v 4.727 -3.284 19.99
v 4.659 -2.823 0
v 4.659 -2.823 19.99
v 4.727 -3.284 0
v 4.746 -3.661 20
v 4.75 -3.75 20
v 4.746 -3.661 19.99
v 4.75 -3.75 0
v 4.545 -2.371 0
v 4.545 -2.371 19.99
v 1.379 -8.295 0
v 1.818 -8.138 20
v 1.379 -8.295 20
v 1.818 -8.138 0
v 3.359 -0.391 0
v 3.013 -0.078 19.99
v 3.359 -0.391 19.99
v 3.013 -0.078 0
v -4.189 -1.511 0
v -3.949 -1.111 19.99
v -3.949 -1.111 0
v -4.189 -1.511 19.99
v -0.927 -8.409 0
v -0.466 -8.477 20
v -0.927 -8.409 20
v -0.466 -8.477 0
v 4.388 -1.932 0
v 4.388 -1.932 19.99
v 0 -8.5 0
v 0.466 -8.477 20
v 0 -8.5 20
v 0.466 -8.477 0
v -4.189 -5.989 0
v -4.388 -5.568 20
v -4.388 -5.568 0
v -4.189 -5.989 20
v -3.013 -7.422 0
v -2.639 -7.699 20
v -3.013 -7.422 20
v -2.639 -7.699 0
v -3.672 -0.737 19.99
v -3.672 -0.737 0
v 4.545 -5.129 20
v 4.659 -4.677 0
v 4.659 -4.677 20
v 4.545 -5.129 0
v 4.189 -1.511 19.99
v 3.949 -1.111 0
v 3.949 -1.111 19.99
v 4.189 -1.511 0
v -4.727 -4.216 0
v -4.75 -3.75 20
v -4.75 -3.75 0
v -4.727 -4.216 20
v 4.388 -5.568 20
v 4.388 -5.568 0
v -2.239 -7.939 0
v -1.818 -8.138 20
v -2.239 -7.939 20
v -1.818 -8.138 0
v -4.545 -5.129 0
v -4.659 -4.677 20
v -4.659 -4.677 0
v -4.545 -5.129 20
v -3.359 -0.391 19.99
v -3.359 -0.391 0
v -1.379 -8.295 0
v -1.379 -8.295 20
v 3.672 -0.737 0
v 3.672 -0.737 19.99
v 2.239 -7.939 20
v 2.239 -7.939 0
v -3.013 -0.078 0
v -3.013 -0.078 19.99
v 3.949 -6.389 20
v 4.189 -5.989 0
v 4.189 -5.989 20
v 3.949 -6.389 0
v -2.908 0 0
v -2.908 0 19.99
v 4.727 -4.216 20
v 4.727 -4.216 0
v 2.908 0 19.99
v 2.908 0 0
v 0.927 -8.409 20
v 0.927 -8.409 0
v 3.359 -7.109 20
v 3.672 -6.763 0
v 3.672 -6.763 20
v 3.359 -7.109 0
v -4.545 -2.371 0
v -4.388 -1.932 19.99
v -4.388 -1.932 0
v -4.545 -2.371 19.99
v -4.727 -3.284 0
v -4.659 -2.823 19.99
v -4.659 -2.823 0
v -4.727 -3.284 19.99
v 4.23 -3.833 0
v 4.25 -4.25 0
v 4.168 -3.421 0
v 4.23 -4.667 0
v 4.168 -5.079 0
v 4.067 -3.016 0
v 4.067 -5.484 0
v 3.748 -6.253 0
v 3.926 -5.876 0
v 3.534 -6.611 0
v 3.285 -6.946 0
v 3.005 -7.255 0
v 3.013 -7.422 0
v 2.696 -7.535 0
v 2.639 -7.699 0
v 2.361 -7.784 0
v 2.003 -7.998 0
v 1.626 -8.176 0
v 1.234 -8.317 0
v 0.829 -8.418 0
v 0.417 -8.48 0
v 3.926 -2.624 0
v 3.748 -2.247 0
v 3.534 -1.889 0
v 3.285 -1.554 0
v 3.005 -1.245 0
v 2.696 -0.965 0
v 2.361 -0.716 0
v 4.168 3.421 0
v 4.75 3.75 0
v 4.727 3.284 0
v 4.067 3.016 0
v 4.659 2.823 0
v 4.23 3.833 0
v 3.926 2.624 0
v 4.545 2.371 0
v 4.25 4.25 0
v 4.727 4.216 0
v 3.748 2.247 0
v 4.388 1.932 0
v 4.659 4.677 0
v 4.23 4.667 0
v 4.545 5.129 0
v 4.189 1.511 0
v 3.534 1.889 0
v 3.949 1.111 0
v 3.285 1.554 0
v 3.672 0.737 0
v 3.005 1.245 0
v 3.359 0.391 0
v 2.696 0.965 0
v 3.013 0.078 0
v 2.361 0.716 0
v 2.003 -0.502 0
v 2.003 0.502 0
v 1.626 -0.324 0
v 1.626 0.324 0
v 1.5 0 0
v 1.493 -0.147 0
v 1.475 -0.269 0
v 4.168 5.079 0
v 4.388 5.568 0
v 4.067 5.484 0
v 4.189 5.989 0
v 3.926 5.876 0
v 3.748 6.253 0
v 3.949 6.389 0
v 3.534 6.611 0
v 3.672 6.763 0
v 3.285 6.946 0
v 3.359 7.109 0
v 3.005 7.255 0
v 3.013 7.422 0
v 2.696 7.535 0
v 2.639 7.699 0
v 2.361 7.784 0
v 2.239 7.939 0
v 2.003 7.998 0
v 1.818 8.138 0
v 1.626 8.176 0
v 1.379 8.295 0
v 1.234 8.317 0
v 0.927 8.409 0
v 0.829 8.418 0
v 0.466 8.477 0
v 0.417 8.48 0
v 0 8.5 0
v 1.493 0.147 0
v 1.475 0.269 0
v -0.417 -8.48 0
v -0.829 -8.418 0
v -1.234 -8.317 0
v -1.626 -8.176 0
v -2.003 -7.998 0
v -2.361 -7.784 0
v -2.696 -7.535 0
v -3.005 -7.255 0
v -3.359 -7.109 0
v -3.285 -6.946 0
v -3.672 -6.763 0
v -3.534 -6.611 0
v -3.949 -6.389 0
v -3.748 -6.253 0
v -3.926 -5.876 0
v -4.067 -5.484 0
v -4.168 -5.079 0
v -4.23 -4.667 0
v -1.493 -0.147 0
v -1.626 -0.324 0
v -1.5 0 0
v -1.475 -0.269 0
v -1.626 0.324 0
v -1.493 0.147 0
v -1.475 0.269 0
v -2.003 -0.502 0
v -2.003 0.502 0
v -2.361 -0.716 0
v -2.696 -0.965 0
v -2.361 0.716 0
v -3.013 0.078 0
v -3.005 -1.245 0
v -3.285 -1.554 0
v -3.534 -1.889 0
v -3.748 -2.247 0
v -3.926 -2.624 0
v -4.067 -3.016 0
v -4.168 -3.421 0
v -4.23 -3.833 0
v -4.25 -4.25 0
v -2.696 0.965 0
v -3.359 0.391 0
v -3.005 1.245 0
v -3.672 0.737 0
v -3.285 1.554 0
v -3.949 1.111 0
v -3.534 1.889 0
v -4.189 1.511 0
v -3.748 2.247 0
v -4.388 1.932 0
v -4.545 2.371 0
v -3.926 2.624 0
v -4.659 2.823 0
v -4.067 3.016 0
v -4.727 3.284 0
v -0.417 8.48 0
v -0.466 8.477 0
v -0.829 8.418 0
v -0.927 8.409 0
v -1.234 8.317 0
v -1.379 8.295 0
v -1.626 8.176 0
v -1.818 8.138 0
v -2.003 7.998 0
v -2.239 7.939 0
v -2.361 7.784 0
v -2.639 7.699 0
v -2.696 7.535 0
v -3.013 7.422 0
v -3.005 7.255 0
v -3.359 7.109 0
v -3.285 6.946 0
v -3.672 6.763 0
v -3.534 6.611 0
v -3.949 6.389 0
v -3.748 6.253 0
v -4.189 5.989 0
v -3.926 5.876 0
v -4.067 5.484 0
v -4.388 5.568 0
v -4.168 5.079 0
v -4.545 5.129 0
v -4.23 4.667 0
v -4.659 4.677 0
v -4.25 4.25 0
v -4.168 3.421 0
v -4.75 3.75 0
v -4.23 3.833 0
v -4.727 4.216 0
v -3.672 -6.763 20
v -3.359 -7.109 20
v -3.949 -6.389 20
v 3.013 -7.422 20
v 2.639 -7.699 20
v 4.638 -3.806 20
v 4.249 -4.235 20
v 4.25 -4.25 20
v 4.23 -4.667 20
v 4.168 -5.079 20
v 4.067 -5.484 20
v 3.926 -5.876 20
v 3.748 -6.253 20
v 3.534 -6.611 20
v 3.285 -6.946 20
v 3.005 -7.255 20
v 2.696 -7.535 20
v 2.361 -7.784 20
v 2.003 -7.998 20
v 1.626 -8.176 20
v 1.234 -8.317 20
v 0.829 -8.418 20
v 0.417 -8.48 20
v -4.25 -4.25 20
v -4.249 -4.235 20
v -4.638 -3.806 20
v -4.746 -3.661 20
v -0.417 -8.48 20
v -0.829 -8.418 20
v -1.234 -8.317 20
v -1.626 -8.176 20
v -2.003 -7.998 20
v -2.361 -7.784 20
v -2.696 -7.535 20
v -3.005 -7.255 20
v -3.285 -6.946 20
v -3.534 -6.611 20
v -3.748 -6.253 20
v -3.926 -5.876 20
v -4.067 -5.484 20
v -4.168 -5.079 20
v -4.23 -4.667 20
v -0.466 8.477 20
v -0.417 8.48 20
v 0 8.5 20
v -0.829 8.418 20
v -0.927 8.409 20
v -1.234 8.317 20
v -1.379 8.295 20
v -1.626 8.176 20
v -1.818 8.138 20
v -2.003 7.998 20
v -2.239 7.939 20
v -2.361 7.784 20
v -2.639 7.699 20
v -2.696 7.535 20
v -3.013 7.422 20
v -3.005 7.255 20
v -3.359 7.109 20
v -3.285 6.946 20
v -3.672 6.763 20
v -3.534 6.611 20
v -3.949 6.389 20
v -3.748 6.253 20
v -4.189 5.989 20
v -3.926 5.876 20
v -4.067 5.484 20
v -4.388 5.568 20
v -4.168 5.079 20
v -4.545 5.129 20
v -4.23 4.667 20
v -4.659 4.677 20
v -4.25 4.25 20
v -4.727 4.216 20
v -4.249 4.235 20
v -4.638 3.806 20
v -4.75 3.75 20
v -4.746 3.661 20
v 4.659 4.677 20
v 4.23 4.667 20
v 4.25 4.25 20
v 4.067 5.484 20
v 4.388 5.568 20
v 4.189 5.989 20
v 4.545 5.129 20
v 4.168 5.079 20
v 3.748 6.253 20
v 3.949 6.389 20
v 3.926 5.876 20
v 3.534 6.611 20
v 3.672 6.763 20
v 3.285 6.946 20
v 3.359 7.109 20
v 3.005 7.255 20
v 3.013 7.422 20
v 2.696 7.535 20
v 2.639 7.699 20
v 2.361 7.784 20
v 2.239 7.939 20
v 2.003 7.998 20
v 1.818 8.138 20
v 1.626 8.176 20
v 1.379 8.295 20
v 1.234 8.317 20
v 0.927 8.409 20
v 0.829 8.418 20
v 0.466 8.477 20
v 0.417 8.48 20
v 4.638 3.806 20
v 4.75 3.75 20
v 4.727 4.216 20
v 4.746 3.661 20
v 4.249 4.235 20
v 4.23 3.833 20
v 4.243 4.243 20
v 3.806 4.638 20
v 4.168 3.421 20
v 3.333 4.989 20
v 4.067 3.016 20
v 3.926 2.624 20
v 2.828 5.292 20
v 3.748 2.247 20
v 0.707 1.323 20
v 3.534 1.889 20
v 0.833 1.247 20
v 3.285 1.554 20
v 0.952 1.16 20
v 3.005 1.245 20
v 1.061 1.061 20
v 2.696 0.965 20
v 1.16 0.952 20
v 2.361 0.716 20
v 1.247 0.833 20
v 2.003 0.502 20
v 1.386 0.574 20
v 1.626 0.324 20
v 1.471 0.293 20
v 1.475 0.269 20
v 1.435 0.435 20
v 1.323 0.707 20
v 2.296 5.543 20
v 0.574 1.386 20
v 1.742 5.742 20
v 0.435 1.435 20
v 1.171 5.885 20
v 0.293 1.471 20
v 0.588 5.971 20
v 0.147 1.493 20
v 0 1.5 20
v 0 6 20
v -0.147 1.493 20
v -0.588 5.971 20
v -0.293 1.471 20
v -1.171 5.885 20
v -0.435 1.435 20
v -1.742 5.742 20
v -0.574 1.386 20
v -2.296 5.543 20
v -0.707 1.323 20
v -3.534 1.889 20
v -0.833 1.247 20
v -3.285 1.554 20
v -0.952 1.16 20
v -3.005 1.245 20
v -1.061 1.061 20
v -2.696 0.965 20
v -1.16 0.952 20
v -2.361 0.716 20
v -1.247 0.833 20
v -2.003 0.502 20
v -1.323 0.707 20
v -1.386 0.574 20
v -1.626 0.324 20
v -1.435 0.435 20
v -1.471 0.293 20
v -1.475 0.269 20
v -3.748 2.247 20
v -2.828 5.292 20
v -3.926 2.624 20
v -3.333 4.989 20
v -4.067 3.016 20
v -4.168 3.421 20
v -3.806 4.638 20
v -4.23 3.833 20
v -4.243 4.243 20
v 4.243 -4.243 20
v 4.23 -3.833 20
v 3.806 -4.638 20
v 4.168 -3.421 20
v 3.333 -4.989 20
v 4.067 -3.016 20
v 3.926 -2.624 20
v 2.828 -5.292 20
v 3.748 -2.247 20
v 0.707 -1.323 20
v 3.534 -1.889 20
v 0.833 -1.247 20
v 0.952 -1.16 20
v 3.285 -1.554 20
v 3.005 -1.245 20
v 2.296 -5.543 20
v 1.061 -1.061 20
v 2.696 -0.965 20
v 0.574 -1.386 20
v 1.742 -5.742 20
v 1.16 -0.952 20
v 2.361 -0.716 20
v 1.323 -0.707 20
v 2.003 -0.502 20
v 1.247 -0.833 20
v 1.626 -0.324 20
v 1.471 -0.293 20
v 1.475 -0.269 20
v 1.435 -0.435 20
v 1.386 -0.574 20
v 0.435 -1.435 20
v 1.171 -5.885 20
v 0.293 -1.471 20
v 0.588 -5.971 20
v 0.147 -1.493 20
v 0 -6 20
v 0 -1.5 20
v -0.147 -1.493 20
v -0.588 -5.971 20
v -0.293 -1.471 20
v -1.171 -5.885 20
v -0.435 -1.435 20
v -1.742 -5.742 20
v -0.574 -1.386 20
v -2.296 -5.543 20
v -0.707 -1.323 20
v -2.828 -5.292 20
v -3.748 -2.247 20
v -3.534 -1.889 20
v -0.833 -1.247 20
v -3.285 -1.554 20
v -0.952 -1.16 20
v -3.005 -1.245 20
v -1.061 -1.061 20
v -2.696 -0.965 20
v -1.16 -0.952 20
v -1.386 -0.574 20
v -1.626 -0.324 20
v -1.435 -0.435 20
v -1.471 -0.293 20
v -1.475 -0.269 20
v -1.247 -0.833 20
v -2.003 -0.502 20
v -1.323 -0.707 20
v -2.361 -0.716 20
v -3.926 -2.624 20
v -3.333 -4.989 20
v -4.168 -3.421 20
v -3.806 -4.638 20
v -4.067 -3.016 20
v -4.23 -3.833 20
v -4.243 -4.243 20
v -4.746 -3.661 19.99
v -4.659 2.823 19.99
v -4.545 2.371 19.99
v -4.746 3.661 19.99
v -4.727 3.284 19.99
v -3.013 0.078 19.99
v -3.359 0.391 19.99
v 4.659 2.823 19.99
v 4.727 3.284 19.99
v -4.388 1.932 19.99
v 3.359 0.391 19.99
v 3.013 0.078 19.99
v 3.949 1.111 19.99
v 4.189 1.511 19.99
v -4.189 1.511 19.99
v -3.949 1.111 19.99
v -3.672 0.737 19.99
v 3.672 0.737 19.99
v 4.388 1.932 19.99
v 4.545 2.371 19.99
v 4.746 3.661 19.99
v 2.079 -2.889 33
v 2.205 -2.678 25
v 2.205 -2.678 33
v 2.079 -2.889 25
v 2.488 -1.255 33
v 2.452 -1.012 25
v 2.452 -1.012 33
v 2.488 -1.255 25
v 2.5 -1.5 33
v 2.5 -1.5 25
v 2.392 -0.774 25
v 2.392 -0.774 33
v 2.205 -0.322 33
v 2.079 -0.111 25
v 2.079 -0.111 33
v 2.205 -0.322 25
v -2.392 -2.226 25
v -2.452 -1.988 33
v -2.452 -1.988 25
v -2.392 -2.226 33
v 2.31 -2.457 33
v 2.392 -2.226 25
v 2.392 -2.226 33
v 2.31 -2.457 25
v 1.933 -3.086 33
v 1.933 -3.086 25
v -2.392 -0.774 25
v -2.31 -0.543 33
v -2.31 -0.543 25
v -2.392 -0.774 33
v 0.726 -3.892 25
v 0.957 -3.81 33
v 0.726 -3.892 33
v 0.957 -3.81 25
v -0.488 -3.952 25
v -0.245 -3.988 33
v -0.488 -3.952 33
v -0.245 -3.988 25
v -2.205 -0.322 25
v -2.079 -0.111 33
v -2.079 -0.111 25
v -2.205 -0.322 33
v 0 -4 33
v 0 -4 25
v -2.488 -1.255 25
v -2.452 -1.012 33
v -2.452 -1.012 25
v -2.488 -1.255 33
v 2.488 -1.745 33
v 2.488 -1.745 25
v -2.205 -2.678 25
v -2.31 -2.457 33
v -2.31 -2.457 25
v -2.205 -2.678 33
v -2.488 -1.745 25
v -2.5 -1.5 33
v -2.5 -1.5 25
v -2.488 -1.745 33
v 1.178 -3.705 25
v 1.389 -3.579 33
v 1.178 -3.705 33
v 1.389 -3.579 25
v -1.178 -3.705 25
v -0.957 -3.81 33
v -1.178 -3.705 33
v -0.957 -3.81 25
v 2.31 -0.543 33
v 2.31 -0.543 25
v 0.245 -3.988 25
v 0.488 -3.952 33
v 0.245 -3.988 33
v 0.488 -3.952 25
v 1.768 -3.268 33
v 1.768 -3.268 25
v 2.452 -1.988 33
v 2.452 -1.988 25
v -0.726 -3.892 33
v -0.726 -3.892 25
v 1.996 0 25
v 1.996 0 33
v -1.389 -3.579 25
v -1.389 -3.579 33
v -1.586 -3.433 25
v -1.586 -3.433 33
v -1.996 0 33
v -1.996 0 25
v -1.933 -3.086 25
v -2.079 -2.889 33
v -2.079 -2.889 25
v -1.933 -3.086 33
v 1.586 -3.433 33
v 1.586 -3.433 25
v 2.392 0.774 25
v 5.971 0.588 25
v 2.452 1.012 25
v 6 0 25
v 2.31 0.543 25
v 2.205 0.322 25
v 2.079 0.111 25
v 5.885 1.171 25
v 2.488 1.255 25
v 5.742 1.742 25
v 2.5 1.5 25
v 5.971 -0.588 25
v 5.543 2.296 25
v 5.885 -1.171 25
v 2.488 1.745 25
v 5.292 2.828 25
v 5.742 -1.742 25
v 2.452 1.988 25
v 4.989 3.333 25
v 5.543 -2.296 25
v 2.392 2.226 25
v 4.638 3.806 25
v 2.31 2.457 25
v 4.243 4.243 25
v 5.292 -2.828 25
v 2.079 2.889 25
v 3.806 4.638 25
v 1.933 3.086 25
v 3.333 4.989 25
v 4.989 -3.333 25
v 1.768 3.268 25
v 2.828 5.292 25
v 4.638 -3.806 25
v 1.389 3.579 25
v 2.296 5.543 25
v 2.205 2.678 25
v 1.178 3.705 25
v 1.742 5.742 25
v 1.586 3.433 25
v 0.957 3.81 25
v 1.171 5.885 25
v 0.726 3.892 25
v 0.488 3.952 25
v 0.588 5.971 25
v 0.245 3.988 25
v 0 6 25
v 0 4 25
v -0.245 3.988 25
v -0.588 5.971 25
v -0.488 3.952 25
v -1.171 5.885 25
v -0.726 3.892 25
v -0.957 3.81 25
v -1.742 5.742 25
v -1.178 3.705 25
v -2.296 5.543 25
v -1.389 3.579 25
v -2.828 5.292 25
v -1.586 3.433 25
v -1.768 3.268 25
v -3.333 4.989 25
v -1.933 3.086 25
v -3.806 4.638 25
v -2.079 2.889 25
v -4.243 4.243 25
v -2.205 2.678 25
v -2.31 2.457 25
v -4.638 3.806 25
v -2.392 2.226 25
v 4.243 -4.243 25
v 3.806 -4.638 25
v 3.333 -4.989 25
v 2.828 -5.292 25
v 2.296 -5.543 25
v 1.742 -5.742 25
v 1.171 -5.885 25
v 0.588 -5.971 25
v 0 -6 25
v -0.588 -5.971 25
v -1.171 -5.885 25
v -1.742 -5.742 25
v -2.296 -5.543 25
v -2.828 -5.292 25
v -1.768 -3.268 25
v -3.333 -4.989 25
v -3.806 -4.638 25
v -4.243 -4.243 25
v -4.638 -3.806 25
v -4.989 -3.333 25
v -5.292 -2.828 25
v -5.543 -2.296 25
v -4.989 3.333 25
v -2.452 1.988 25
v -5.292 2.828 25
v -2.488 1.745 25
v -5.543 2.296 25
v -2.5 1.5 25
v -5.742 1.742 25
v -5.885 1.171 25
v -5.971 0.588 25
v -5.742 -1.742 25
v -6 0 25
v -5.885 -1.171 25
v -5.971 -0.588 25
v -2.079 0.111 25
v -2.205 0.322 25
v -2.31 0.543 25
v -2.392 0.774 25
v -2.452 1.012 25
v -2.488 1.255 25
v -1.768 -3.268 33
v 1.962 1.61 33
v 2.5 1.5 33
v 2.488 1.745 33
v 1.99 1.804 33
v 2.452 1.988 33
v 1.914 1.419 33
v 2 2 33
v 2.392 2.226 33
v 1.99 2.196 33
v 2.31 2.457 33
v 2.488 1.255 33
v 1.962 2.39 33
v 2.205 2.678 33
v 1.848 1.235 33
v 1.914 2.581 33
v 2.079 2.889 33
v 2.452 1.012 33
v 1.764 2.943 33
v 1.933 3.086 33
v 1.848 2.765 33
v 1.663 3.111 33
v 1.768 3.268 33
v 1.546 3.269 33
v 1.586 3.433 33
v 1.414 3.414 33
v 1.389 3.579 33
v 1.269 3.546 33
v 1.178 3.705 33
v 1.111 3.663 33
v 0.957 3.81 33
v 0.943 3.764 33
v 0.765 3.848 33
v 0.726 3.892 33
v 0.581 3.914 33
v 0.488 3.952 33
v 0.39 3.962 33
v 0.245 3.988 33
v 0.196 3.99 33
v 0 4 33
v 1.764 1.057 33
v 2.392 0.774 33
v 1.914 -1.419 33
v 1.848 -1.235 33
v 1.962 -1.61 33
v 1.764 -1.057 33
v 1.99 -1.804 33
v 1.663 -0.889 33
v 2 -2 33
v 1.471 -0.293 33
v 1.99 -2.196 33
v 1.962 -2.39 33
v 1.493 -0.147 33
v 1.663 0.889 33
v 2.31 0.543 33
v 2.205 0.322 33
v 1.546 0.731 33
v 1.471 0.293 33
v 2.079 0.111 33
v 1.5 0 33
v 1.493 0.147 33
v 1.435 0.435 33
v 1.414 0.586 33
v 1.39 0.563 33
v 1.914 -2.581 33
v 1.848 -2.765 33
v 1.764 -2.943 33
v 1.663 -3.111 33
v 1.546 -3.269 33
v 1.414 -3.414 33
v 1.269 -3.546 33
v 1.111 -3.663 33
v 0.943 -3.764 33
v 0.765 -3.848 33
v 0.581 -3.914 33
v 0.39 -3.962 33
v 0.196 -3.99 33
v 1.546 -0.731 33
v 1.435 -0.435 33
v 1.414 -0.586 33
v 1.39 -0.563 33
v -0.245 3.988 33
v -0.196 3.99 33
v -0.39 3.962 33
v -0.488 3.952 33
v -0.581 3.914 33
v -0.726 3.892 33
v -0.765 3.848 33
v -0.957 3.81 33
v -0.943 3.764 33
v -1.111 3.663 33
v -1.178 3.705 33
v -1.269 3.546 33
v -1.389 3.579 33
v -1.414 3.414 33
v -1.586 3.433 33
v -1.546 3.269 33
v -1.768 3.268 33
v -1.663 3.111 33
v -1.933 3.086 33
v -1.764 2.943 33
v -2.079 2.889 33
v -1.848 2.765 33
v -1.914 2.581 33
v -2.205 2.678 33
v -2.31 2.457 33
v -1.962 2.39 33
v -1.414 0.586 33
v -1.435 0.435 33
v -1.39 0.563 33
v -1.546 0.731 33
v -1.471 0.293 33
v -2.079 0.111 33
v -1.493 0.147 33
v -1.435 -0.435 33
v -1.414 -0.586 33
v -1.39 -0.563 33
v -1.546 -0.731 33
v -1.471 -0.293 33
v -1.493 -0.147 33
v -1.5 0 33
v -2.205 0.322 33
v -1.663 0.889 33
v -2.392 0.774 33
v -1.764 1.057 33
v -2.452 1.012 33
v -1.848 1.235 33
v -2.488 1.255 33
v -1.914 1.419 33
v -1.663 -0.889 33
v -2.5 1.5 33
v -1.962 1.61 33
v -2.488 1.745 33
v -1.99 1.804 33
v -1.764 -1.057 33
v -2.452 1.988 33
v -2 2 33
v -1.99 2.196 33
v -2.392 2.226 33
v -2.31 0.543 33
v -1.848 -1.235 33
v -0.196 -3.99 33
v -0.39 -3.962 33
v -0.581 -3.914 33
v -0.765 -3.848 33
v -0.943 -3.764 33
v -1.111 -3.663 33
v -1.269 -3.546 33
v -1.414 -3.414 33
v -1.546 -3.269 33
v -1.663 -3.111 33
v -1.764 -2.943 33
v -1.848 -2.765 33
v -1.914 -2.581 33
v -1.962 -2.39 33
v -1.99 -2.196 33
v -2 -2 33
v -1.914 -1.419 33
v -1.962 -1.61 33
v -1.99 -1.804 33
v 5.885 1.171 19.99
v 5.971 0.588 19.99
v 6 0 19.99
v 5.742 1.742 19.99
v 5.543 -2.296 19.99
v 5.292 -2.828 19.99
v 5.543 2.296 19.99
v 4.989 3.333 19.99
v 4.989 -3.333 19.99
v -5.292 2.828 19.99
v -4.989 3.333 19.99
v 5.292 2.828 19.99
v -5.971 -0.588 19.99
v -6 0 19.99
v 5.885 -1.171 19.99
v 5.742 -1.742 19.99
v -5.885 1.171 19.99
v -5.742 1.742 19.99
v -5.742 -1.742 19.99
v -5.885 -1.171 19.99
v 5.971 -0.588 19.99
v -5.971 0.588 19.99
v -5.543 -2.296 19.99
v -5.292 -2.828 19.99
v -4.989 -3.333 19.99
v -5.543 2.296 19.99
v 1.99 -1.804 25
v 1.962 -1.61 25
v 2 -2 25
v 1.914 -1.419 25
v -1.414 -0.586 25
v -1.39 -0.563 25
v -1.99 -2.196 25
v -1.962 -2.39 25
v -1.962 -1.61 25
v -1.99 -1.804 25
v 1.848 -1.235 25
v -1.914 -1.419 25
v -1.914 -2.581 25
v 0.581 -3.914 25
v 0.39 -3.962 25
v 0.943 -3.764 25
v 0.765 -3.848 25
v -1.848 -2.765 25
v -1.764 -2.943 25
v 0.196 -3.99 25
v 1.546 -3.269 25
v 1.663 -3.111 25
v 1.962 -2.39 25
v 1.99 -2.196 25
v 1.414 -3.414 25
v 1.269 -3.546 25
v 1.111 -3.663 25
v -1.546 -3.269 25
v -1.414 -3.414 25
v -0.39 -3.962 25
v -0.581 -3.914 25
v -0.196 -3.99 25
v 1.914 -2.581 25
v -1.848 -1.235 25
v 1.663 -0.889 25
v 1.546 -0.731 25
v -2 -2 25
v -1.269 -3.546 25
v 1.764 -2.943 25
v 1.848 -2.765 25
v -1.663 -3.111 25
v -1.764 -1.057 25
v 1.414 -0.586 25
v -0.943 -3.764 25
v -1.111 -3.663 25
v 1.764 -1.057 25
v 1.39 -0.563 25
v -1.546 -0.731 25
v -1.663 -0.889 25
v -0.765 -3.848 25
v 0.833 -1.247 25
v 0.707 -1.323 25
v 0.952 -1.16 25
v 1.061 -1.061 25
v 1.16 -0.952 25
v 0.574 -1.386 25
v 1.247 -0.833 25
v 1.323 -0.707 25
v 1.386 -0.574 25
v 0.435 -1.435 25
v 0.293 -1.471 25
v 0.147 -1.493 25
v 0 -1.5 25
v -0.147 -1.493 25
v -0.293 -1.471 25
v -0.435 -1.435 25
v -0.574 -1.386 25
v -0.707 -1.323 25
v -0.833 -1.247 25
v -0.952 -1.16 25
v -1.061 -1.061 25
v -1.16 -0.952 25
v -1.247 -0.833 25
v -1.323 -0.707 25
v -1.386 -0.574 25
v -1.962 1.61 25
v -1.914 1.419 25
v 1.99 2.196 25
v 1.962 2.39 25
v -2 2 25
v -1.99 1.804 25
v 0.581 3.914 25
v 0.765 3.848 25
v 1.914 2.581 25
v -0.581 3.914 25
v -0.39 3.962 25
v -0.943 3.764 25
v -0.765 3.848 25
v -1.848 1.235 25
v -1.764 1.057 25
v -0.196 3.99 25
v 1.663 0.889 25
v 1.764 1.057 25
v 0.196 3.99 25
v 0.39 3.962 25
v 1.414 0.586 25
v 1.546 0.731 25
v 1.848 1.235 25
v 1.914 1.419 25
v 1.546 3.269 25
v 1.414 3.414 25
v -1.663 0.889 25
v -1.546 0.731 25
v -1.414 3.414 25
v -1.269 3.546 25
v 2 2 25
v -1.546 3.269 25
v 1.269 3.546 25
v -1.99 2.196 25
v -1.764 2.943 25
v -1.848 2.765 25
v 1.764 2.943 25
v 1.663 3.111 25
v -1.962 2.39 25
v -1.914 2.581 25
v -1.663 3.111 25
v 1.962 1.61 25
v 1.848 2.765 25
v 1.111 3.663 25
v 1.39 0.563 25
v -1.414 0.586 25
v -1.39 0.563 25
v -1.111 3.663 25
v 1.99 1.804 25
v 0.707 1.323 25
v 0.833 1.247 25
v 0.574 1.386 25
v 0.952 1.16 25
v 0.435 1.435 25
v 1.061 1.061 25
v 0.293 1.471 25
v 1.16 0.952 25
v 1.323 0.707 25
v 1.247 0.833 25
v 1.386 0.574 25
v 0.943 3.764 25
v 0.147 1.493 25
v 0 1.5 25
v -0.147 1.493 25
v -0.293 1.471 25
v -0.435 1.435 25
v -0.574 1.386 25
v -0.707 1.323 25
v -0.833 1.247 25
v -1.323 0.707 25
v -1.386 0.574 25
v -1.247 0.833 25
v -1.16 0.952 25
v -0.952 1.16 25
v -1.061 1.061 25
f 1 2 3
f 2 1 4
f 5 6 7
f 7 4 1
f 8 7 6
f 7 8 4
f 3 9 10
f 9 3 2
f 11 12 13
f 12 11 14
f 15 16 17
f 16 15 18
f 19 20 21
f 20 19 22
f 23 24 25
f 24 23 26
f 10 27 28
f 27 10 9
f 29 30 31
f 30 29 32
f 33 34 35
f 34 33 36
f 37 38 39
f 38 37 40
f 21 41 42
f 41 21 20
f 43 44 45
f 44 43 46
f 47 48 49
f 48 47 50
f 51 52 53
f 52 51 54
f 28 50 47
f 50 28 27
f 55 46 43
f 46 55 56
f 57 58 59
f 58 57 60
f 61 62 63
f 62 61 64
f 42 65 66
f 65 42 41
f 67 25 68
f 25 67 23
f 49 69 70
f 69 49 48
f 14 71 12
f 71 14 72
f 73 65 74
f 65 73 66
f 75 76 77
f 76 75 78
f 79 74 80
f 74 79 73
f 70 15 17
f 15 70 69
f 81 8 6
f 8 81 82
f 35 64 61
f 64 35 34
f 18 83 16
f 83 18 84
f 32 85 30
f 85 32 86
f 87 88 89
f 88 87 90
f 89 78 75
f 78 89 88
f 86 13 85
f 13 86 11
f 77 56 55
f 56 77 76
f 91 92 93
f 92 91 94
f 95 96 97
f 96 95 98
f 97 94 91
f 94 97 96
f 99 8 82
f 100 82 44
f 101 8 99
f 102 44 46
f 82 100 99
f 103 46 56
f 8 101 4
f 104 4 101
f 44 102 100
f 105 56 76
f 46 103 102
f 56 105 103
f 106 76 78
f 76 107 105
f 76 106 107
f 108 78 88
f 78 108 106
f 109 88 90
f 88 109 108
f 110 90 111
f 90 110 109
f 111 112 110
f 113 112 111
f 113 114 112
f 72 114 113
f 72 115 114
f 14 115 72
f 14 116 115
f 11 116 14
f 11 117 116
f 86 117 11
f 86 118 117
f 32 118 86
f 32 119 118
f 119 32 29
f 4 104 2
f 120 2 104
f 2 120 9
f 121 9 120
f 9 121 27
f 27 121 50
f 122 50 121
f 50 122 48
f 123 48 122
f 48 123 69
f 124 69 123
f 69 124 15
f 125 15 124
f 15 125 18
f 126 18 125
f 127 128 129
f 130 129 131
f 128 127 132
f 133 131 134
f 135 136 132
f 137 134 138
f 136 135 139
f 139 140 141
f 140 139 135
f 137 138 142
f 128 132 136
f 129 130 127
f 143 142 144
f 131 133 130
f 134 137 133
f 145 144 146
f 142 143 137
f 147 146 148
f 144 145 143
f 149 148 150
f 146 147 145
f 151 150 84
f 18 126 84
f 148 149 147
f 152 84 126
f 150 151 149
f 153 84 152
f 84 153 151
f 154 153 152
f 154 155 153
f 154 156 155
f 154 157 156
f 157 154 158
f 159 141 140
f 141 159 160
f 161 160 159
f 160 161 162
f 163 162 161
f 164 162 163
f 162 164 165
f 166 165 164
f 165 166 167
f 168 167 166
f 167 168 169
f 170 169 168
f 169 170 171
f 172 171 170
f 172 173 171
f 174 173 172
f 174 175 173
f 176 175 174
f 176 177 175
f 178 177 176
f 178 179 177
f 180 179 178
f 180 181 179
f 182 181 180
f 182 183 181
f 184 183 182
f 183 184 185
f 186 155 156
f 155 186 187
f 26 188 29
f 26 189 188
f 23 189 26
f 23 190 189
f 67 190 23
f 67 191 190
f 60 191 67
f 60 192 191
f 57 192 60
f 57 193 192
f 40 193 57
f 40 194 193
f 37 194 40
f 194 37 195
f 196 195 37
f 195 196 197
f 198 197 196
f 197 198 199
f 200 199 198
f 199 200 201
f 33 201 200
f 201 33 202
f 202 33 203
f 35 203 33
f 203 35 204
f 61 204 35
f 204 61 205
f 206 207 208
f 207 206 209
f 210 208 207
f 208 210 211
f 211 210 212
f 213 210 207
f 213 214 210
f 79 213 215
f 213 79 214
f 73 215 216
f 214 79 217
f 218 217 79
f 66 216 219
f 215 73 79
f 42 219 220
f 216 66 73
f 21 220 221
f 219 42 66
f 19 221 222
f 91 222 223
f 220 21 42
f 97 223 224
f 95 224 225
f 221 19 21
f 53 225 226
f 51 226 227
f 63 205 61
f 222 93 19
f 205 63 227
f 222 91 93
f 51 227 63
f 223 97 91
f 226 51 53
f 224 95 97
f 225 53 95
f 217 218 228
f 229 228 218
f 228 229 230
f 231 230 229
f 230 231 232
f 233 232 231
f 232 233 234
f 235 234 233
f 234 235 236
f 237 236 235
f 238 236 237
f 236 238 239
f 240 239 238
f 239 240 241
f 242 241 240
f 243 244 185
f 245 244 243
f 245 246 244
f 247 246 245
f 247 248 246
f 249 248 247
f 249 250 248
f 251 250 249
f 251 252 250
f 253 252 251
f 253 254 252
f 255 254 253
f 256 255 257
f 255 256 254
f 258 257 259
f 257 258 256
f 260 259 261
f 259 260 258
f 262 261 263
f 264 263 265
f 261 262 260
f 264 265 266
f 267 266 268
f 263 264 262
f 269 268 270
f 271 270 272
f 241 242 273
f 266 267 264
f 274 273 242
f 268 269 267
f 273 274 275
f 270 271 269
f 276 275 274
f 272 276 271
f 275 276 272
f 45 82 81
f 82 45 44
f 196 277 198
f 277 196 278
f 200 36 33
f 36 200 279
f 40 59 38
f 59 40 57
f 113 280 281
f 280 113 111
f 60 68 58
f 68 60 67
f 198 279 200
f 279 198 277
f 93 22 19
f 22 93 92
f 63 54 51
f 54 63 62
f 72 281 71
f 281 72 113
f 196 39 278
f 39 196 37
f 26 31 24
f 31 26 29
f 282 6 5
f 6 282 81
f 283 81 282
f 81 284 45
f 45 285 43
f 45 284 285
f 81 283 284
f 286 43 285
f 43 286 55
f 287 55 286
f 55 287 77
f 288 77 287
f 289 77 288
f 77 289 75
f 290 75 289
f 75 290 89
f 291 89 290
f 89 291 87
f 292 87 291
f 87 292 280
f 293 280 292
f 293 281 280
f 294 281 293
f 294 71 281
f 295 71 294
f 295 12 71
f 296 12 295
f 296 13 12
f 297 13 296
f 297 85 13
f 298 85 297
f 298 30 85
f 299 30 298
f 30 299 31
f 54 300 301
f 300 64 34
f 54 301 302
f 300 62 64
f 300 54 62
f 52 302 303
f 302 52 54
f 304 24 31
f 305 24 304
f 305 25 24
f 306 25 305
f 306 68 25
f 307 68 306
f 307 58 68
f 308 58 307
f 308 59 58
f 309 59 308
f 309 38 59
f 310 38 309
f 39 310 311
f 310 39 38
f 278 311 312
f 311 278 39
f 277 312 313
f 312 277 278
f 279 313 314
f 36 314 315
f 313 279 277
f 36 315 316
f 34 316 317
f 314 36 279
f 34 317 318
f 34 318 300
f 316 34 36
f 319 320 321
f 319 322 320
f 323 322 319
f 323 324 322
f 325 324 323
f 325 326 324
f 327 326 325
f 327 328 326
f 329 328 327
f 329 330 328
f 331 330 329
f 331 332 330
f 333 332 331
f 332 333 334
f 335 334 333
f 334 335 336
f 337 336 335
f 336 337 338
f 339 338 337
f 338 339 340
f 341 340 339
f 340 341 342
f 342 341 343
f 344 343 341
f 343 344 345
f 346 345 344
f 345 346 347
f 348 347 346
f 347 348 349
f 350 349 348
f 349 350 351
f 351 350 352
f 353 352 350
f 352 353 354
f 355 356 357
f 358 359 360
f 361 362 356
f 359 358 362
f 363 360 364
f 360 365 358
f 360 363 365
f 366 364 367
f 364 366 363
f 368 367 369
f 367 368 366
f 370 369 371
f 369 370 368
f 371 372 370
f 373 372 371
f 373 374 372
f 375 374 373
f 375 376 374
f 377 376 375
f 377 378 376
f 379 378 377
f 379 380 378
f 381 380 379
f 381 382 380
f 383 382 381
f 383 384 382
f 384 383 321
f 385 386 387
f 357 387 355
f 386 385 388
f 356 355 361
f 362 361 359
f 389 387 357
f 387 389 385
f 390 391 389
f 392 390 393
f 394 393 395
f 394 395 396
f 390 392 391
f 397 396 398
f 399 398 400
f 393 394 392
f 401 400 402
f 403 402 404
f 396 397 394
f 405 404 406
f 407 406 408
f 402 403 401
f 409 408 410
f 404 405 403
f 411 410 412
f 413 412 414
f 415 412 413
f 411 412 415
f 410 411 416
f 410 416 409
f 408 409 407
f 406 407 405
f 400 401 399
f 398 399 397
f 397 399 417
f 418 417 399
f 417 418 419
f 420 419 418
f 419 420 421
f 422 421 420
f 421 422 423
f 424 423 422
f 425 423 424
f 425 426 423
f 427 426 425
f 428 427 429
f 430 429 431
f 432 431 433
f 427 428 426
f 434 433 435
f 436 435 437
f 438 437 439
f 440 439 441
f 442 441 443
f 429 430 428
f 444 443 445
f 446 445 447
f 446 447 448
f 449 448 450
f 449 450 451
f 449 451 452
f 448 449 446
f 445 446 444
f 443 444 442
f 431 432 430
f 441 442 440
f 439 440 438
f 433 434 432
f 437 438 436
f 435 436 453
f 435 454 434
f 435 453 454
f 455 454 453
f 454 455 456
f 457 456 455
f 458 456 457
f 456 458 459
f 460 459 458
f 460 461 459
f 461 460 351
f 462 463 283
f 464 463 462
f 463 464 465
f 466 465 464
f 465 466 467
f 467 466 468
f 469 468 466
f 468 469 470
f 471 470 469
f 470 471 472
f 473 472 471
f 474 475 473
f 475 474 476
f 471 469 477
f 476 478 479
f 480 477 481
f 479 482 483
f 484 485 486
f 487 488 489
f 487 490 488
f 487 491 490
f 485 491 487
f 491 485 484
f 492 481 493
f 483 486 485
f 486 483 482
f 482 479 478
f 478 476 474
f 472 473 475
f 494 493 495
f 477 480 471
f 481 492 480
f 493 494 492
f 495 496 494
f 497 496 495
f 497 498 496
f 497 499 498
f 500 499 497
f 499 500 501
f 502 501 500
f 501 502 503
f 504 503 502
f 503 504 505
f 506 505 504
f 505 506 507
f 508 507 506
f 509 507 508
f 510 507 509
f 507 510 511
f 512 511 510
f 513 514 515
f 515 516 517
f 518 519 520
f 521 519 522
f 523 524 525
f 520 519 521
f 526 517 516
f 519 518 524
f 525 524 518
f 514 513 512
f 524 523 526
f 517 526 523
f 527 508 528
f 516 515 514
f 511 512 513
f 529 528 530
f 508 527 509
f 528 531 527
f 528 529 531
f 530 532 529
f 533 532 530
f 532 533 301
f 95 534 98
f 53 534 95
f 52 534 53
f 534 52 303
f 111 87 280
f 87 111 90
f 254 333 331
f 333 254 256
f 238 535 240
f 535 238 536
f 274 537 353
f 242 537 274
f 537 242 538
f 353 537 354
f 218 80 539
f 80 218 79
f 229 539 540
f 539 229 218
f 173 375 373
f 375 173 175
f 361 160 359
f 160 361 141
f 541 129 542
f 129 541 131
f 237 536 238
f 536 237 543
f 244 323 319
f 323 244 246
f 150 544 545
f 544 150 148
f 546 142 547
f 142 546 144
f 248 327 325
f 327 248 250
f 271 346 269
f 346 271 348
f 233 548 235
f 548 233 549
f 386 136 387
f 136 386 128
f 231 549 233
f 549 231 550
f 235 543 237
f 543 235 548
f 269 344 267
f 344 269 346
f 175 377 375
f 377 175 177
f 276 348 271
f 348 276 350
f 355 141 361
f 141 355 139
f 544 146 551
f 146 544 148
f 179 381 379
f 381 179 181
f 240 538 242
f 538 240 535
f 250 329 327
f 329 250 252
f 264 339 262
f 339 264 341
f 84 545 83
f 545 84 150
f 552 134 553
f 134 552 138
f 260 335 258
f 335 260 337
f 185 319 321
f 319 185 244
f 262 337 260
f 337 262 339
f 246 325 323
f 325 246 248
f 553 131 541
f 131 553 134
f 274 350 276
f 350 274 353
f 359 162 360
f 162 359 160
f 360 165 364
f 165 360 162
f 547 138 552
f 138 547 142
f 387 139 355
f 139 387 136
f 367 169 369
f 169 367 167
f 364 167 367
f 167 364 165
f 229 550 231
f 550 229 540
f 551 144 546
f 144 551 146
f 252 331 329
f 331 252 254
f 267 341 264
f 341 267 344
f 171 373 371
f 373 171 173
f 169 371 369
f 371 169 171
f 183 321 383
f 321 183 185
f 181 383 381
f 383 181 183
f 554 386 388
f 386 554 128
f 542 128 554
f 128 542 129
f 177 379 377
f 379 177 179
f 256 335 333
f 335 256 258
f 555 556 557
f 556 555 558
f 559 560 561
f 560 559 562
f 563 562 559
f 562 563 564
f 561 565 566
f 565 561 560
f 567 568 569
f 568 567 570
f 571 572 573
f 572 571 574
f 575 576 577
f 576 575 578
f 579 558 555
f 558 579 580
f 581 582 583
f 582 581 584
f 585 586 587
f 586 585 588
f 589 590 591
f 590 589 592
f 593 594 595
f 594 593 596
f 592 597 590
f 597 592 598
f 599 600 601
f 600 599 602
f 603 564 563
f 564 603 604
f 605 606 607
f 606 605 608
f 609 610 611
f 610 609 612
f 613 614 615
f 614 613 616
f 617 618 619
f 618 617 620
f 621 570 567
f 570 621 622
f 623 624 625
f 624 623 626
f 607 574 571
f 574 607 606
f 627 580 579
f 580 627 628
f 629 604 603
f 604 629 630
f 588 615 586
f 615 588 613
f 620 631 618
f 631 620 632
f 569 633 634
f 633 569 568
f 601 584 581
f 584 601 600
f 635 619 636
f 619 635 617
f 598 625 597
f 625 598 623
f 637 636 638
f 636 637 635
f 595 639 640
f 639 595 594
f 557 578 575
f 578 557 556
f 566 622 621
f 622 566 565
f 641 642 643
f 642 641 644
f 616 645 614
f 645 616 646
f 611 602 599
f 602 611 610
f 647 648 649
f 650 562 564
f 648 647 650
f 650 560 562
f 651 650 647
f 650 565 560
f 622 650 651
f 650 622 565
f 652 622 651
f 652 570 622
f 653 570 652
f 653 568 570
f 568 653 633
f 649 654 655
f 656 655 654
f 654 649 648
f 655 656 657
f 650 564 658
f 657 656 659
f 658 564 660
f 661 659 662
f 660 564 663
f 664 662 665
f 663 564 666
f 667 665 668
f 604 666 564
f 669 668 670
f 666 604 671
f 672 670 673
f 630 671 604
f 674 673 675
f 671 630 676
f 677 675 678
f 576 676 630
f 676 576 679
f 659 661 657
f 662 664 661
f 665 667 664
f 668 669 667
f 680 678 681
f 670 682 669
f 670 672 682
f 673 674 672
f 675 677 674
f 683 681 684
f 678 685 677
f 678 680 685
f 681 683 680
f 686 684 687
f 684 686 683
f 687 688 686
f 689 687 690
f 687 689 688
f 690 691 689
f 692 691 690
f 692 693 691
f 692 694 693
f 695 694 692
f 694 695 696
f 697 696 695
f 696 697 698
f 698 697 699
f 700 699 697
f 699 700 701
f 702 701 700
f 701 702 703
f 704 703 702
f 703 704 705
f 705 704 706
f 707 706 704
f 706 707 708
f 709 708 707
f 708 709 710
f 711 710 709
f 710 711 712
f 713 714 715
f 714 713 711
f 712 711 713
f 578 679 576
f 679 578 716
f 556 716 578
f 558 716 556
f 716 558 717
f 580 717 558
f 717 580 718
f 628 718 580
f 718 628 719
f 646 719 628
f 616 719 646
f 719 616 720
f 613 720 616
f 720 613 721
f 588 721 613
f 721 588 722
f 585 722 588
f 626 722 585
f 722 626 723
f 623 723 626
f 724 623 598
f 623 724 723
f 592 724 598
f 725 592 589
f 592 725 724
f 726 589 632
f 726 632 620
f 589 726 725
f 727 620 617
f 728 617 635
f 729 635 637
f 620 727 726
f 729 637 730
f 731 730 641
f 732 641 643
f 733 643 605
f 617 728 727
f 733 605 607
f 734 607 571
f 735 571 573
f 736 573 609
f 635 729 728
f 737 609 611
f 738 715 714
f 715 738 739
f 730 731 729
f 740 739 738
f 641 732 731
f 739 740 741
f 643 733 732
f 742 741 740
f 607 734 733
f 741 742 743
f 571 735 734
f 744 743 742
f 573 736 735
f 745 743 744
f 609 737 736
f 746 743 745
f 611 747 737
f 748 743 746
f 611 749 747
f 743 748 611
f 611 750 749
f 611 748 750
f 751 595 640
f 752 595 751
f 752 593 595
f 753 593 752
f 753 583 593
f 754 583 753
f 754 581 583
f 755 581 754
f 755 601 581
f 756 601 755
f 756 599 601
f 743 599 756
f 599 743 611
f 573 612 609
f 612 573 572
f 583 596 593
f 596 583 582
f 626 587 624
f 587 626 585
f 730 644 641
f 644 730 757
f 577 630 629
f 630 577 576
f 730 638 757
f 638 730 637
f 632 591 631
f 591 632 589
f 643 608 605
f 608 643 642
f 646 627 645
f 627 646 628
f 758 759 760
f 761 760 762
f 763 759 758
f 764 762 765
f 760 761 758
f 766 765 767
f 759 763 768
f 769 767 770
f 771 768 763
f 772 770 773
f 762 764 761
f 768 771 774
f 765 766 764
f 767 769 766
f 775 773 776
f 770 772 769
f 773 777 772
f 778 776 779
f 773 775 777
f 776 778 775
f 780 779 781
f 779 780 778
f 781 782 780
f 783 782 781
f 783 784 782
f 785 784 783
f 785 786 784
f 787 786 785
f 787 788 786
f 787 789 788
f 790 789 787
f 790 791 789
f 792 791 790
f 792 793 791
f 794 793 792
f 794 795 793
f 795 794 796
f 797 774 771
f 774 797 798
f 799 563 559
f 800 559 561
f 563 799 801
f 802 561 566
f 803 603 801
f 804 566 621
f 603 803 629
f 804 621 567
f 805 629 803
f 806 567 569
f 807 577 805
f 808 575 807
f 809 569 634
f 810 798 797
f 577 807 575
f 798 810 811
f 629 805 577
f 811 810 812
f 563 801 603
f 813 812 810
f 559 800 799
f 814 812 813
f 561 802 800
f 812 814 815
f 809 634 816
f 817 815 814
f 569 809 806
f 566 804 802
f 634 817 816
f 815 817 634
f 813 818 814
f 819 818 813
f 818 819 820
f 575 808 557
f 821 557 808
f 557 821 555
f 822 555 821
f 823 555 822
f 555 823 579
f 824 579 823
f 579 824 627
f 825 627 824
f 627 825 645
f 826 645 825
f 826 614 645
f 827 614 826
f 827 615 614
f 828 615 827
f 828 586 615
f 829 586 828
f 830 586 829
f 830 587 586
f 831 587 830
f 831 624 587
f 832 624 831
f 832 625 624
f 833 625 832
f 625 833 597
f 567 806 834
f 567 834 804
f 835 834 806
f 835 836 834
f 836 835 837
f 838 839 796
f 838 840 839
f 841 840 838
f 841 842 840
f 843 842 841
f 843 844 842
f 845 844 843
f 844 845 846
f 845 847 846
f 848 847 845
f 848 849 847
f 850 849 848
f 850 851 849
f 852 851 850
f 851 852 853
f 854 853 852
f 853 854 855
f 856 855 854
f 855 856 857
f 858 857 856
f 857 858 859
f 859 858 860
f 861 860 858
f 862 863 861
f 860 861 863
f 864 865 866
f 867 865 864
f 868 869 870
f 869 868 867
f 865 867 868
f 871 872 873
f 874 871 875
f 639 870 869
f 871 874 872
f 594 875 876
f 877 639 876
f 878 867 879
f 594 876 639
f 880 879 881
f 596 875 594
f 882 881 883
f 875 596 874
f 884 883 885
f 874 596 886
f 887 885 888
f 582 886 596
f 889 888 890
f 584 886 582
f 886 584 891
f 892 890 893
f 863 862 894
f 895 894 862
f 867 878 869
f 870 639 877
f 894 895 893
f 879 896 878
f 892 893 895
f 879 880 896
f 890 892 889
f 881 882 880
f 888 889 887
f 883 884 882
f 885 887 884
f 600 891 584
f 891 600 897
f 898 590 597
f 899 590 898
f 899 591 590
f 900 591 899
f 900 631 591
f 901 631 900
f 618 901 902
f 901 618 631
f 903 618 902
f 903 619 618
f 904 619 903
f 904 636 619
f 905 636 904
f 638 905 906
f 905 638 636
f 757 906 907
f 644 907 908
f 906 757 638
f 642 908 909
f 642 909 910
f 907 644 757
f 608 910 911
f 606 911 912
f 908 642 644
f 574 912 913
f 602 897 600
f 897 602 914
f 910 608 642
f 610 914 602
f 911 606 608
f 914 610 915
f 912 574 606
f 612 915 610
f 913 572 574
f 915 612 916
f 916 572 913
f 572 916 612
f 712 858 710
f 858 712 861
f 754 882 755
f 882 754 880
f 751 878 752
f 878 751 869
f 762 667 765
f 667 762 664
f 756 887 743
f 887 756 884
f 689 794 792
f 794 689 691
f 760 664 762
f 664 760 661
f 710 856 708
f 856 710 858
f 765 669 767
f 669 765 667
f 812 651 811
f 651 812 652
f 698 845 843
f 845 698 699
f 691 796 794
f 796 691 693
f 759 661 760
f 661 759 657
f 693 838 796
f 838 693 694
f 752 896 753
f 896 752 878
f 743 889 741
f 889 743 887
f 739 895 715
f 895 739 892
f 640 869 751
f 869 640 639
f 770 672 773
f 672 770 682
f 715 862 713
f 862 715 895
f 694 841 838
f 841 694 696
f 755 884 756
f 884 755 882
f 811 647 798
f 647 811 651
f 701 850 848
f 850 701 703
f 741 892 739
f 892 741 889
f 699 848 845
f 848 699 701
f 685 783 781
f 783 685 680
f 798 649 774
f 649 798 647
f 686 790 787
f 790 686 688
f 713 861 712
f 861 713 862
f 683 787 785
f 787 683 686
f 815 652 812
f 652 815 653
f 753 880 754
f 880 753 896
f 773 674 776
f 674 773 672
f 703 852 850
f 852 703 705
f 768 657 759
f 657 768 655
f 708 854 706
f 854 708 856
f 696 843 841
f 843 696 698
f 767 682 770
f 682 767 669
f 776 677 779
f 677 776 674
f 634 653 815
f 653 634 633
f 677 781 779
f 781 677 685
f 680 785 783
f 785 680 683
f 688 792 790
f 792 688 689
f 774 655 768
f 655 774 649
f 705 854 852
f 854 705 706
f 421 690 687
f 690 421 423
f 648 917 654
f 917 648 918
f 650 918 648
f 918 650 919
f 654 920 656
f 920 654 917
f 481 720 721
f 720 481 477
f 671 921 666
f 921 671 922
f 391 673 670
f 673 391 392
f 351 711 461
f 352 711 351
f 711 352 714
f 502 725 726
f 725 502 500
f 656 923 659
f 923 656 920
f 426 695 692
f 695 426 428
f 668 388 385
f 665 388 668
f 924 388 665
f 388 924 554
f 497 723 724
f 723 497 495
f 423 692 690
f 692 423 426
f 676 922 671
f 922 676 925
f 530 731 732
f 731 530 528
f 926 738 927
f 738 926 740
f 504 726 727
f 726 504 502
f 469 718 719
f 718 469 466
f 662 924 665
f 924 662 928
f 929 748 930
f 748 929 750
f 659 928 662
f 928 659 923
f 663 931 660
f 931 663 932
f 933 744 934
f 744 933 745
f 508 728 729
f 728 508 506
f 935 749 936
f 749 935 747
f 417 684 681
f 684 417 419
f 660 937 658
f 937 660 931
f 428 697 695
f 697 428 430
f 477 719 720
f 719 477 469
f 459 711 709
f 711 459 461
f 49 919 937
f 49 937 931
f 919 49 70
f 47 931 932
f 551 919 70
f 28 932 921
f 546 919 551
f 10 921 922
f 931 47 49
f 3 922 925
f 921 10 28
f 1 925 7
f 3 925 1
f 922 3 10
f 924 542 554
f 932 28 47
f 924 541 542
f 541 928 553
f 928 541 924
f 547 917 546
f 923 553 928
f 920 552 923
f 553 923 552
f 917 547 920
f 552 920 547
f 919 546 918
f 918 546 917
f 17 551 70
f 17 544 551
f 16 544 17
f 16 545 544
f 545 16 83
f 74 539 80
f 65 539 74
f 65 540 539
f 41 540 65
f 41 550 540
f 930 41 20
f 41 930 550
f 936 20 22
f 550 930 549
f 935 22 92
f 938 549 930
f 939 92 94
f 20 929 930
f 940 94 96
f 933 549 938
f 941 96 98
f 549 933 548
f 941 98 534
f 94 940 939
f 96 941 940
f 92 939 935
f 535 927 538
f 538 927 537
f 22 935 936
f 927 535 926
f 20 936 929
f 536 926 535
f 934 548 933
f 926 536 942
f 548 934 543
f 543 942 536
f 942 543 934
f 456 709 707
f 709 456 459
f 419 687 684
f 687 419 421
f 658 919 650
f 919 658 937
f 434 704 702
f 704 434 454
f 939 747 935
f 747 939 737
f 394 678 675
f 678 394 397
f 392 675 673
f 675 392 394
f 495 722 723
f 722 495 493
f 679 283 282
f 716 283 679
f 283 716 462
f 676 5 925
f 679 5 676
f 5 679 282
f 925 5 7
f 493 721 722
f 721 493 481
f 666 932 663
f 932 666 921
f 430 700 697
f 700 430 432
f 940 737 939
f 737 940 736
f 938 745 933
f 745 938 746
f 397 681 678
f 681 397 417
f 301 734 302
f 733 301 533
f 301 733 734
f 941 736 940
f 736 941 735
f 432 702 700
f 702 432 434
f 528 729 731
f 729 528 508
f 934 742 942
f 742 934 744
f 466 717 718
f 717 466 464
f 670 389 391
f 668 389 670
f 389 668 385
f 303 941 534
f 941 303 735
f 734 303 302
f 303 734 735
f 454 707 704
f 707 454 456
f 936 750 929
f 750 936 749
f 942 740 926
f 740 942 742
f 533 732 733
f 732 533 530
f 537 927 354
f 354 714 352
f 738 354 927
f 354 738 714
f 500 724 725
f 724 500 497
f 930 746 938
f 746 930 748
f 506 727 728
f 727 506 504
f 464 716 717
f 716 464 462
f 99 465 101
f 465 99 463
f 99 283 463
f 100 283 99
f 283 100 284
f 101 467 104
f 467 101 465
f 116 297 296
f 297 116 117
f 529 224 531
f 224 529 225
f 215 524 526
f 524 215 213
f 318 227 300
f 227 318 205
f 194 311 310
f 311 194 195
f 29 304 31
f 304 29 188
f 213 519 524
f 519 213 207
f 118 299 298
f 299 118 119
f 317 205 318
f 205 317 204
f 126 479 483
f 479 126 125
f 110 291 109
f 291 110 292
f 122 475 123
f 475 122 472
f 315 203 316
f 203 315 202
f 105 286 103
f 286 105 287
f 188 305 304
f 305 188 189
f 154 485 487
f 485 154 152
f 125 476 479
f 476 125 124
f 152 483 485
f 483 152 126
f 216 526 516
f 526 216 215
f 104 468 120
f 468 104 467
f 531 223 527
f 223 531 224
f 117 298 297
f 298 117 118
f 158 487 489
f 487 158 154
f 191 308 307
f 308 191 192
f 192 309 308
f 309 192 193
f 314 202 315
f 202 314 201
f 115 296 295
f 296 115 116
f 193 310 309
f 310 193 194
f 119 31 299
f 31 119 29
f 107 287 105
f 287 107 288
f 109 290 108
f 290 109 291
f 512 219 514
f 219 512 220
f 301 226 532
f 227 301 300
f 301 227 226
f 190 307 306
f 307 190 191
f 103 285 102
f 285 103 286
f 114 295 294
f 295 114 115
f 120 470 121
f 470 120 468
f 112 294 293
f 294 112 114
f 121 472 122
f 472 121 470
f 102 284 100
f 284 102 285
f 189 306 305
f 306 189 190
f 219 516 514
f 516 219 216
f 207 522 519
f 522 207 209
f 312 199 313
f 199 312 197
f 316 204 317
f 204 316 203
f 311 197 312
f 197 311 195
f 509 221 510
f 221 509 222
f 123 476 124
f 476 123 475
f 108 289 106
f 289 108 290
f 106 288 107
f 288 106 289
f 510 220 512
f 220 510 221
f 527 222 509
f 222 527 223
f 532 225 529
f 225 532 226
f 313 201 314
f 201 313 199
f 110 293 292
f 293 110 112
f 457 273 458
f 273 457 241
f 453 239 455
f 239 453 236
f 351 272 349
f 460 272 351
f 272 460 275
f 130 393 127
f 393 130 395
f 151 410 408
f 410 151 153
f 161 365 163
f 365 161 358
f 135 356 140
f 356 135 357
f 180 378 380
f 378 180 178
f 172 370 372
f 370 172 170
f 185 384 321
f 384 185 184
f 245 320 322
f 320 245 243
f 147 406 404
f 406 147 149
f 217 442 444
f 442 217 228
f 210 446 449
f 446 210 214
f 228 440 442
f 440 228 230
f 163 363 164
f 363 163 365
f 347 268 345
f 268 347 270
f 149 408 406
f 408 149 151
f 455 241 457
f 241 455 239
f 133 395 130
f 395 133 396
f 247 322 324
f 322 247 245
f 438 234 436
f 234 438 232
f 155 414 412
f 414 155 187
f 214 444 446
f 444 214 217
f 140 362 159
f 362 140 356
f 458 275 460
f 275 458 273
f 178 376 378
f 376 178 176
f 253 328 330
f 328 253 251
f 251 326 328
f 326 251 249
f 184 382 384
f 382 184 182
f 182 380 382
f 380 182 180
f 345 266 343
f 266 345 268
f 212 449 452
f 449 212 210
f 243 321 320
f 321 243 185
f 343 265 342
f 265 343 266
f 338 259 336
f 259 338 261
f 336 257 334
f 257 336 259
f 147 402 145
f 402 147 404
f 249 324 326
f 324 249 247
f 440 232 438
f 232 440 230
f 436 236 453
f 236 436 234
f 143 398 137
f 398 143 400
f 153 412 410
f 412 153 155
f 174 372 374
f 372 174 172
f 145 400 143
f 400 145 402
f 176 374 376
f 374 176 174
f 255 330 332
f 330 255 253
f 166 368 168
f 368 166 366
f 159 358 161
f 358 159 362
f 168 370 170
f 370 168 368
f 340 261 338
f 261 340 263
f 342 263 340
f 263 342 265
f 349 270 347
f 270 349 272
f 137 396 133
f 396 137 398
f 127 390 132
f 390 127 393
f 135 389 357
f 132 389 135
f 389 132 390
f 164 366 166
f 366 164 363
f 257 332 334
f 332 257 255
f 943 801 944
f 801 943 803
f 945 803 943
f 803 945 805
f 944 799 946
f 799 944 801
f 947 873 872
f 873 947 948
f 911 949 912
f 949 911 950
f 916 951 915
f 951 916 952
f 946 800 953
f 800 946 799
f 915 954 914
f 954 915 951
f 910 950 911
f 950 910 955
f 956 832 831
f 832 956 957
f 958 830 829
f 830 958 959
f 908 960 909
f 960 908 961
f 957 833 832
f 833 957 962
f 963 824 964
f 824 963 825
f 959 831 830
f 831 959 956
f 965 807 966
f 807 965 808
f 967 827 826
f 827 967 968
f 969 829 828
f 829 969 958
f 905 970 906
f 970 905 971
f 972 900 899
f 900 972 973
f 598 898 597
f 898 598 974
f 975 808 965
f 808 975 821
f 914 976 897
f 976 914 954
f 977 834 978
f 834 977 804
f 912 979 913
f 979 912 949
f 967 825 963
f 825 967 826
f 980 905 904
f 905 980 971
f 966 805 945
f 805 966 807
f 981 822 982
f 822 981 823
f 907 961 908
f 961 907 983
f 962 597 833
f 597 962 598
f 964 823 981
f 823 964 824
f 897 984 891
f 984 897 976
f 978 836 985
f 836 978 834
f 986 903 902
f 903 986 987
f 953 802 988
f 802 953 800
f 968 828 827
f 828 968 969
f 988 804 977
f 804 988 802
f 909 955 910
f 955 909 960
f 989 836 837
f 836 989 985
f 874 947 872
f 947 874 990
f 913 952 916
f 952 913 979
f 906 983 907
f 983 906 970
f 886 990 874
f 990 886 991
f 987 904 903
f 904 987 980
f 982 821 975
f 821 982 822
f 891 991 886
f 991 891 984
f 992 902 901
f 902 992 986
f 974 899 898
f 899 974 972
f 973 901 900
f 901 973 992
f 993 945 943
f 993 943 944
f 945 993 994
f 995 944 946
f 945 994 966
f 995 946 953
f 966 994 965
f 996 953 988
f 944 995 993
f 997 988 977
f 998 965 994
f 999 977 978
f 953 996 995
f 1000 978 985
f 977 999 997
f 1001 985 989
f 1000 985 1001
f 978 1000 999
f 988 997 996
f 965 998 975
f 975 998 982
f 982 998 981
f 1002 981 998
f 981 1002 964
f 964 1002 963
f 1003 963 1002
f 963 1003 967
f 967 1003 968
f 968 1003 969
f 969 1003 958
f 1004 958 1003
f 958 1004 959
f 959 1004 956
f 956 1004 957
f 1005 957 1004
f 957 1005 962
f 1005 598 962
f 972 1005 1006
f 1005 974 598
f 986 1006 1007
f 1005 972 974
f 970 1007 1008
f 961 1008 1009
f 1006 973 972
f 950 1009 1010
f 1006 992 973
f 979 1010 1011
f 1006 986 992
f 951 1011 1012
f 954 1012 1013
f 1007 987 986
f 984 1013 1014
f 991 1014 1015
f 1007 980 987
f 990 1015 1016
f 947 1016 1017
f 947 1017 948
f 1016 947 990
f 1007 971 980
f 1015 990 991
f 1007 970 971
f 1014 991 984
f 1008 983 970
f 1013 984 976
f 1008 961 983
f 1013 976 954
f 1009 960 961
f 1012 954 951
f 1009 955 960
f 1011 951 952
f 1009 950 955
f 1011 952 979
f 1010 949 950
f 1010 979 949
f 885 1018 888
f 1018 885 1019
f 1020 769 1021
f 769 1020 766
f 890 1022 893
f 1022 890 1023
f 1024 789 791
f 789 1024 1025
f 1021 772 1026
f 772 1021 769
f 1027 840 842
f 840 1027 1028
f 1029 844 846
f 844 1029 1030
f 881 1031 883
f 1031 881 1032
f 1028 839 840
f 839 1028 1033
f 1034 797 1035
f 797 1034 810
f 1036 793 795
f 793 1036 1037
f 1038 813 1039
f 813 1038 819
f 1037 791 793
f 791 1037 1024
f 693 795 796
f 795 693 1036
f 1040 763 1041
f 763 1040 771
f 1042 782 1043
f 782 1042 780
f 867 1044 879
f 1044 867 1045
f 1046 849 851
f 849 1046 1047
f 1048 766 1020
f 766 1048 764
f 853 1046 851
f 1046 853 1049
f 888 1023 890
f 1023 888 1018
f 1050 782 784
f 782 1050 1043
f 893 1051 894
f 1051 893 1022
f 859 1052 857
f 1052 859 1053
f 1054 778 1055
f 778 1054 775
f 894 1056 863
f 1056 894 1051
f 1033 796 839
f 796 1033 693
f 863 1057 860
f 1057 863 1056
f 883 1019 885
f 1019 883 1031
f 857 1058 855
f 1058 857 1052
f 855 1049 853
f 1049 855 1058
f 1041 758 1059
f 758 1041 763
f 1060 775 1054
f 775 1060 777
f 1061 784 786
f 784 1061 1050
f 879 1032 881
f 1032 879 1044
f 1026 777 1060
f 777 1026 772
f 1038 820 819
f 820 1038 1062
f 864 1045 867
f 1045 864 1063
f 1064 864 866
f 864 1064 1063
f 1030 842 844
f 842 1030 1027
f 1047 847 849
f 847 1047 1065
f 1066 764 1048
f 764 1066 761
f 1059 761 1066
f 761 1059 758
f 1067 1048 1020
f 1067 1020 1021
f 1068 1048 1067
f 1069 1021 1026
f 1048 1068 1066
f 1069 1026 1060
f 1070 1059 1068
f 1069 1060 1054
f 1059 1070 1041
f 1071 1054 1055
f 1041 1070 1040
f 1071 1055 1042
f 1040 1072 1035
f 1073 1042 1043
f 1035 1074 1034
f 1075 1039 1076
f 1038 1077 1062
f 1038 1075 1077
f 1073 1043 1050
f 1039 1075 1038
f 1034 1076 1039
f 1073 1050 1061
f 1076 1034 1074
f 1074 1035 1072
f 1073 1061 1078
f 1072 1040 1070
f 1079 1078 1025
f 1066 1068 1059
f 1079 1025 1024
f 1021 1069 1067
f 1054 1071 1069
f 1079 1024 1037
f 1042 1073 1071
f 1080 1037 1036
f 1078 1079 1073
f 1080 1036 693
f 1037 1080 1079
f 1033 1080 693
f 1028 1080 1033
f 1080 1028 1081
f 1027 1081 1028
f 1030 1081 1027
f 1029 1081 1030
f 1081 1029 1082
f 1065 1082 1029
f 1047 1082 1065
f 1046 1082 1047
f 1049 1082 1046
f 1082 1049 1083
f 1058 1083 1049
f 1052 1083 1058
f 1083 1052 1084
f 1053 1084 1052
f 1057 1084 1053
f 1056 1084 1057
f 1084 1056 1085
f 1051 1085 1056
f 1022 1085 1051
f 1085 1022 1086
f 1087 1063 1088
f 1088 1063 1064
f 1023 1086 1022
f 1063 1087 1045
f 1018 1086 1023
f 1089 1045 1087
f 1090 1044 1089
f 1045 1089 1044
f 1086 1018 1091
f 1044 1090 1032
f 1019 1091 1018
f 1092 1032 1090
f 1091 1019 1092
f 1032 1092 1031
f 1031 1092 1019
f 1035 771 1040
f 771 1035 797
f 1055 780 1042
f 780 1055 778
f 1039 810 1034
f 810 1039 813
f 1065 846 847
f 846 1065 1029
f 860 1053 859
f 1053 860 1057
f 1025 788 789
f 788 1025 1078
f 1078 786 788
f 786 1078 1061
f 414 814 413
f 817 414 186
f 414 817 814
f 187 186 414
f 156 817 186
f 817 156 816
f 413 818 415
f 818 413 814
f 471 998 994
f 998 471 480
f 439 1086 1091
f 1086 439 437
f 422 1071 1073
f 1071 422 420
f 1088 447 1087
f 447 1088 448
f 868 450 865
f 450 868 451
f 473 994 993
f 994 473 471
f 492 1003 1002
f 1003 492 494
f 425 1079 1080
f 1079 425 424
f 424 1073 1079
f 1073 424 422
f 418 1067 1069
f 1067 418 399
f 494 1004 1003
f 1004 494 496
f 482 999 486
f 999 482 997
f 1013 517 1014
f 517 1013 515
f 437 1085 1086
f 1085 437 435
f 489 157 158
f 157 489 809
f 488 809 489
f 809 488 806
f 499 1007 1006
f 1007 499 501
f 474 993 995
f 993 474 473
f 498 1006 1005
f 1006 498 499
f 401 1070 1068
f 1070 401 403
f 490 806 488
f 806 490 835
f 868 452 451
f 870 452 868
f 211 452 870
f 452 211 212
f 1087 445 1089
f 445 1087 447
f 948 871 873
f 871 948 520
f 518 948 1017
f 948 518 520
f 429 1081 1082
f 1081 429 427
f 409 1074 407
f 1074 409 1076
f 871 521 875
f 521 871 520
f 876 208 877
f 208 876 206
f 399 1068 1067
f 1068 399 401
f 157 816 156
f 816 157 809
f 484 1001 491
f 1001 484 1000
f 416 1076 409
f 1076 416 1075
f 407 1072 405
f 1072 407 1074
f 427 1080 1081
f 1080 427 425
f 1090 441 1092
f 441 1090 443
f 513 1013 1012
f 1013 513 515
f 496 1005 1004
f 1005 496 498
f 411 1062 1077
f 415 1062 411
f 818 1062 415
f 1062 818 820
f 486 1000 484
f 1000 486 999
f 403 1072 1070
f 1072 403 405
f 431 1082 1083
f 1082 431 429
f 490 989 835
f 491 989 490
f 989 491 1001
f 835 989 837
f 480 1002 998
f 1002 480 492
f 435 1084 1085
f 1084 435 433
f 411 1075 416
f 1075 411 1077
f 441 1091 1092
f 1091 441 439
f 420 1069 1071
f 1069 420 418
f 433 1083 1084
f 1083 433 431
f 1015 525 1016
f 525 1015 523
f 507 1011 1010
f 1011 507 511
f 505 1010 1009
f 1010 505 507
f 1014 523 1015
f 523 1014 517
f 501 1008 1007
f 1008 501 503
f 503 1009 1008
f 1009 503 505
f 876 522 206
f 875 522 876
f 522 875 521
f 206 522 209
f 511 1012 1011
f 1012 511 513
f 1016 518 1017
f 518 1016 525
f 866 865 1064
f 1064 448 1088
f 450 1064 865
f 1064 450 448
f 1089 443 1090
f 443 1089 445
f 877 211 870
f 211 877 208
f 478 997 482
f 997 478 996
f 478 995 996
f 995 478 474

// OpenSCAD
// Hose-barb reducer: 8 mm (split) to 5 mm (split) silicone tubing
// Print orientation: standing upright along Z

$fn = 64;

// ---- Dimensions (mm) ----
tube8_od      = 9.5;   // 8 mm tubing outer diameter (split)
tube8_id      = 7.5;   // 8 mm tubing inner diameter (split)
tube5_od      = 5.0;   // 5 mm tubing outer diameter (split)
tube5_id      = 3.0;   // 5 mm tubing inner diameter (split)
bore          = 3;     // through-bore diameter
collar_od     = 12;    // collar outer diameter
collar_id     = 9.5;   // collar inner diameter
collar_h      = 5;     // collar height
barb8_h       = 10;    // 8 mm barb height
barb5_h       = 8;     // 5 mm barb height
eps           = 0.5;   // cutter overshoot

z_8           = 20;    // 8 mm section height
z_5           = z_8 + collar_h;   // top of 5 mm section (25)
z_top         = z_5 + max(barb5_h, barb8_h); // 41

// ---- Model ----
difference() {
    union() {
        // 8 mm split tubing
        for (a = [0, 180])
            rotate([0, 0, a])
                translate([0, -tube8_id/2, 0])
                    cylinder(h = z_8, d = tube8_od);

        // Collar
        translate([0, 0, z_8 - 0.01])
            cylinder(h = collar_h + 0.01, d = collar_od);

        // 5 mm split tubing
        for (a = [0, 180])
            rotate([0, 0, a])
                translate([0, -tube5_id/2, z_5])
                    cylinder(h = barb5_h, d = tube5_od);
    }

    // Cutters
    translate([0, 0, -eps])
        cylinder(h = z_top + 2*eps, d = bore);

    // 8 mm groove
    for (a = [0, 180])
        rotate([0, 0, a])
            translate([0, -tube8_id/2 - eps, 0])
                cylinder(h = z_8, d = tube8_id + 2*eps);

    // 5 mm groove
    for (a = [0, 180])
        rotate([0, 0, a])
            translate([0, -tube5_id/2 - eps, z_5])
                cylinder(h = barb5_h, d = tube5_id + 2*eps);
}
